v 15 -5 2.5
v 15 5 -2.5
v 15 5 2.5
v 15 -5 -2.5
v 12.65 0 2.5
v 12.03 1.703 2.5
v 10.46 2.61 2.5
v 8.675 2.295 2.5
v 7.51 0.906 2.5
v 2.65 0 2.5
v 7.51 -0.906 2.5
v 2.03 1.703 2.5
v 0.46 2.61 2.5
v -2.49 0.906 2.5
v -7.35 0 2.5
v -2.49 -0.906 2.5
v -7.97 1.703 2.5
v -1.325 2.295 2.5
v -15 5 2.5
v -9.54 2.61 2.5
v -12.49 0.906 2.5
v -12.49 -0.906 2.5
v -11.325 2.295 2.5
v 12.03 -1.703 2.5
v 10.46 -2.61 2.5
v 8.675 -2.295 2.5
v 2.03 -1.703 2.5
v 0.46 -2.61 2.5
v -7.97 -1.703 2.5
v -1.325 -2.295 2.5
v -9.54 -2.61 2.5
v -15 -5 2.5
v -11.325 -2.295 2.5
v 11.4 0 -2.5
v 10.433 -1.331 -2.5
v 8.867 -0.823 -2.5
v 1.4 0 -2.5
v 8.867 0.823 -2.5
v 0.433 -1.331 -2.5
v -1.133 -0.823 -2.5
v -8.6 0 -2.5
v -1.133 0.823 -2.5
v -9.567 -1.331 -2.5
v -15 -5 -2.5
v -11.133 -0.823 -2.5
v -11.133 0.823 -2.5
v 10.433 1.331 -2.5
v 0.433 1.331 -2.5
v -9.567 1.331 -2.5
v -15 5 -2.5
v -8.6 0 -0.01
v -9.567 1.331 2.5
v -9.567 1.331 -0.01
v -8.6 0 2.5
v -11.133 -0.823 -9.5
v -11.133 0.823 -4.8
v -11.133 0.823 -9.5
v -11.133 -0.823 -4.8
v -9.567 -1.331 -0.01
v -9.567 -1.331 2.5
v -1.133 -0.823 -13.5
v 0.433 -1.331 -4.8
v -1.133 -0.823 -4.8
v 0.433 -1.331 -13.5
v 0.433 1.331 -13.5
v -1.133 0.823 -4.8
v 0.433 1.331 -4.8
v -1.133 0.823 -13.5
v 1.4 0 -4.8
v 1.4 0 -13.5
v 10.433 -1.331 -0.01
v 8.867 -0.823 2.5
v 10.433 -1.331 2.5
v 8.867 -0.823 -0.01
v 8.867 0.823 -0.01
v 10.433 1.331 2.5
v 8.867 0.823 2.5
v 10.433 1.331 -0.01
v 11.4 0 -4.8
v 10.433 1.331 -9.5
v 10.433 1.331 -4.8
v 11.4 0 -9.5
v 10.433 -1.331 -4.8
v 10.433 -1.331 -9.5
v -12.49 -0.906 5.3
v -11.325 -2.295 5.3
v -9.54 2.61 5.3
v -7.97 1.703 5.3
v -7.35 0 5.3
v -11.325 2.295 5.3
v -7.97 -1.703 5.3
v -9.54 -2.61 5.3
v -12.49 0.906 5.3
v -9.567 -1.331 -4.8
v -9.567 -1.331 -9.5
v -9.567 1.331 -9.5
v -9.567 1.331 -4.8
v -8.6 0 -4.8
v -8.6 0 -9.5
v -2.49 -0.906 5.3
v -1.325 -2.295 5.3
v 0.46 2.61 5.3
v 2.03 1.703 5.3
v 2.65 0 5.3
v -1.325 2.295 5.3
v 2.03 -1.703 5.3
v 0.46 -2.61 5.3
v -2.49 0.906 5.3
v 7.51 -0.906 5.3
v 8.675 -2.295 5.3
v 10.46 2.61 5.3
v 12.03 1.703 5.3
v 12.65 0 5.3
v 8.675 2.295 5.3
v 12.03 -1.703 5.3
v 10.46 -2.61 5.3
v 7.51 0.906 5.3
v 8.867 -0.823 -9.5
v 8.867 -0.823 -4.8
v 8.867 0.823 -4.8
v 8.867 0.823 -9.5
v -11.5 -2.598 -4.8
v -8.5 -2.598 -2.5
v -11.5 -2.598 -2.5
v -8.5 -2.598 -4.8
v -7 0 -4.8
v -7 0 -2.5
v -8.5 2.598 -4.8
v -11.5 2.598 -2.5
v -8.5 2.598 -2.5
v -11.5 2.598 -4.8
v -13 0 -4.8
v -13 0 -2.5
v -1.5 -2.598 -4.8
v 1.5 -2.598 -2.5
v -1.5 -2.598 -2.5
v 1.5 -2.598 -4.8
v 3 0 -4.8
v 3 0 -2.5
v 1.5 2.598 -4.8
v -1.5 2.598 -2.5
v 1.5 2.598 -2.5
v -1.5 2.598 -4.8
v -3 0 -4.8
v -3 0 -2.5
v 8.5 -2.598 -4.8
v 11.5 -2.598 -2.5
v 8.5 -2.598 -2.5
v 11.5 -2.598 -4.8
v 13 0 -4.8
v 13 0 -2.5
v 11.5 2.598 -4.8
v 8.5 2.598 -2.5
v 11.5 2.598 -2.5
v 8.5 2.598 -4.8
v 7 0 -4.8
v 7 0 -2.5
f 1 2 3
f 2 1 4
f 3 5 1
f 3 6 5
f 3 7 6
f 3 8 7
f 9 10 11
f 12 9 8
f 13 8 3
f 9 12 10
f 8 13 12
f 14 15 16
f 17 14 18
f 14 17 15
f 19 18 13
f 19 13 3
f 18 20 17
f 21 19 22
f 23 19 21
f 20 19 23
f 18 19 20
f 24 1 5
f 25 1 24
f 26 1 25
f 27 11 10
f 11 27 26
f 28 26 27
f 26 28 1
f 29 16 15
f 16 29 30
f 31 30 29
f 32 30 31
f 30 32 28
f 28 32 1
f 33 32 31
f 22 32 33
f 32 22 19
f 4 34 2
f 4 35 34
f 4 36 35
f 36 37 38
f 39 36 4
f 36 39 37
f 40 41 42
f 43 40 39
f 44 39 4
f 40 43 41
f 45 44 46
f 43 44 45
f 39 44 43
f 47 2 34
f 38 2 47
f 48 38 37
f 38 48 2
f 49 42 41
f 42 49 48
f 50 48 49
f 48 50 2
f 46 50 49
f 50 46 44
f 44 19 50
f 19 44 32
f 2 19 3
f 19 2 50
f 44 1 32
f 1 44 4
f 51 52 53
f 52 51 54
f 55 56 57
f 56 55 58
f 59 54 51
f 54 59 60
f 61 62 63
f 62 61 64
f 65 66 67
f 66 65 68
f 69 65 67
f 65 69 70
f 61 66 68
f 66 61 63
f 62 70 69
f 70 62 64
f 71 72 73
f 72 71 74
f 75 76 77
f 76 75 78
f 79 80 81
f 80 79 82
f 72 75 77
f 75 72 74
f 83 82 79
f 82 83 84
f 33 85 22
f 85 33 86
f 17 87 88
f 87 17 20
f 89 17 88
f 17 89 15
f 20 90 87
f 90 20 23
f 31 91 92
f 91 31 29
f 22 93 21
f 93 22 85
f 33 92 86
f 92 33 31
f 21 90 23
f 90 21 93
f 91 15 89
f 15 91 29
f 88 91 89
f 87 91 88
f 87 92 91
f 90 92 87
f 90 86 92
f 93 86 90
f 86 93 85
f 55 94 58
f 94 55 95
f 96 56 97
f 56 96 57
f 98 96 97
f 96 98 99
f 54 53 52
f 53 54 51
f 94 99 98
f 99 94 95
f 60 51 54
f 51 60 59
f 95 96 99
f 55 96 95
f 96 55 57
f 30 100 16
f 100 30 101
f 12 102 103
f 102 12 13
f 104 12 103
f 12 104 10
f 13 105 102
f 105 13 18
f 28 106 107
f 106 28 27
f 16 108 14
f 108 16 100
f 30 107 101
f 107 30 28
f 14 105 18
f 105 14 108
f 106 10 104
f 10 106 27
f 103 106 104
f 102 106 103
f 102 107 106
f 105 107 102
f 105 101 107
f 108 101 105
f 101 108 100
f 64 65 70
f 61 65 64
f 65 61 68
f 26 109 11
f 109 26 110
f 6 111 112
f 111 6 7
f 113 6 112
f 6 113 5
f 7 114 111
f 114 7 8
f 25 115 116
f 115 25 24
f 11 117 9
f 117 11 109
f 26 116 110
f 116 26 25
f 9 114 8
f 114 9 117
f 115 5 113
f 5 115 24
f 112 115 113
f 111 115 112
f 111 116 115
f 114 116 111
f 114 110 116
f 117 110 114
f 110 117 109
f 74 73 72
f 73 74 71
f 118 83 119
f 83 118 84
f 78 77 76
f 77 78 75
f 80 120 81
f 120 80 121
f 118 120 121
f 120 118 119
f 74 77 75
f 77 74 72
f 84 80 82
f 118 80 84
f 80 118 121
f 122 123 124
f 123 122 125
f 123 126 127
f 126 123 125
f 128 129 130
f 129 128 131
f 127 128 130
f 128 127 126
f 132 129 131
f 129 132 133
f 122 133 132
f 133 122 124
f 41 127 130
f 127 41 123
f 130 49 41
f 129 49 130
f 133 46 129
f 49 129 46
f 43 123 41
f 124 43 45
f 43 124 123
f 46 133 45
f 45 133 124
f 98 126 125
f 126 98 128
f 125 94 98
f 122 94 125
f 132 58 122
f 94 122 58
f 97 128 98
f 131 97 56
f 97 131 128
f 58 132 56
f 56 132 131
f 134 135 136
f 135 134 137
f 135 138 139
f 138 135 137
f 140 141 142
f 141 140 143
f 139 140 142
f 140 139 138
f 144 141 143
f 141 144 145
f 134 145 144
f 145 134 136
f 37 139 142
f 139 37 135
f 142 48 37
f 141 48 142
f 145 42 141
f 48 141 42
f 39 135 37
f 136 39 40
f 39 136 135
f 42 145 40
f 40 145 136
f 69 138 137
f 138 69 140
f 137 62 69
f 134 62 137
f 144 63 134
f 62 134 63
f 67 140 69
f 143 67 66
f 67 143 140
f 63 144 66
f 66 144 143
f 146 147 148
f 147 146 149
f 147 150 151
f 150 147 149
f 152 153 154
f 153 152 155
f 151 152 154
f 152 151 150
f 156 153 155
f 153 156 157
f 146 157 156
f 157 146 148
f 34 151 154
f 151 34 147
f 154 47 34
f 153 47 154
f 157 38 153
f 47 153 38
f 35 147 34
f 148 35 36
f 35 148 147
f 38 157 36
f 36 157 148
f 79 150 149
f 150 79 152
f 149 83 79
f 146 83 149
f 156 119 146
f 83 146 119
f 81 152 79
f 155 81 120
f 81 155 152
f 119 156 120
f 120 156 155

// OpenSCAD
// Generated by SolidPython 0.4.0 on 2019-09-03 12:41:31


union() {
	difference() {
		cube(center = true, size = [30, 10, 5]);
		translate(v = [-10, 0, 0]) {
			translate(v = [0, 0, -0.0100000000]) {
				cylinder(h = 5.0200000000, r = 1.4000000000);
			}
		}
		translate(v = [0, 0, -0.0100000000]) {
			cylinder(h = 5.0200000000, r = 1.4000000000);
		}
		translate(v = [10, 0, 0]) {
			translate(v = [0, 0, -0.0100000000]) {
				cylinder(h = 5.0200000000, r = 1.4000000000);
			}
		}
	}
	translate(v = [-10, 0, 2.5000000000]) {
		union() {
			cylinder(h = 2.8000000000, r = 2.6500000000);
			translate(v = [0, 0, -12]) {
				cylinder(h = 12, r = 1.4000000000);
			}
		}
	}
	translate(v = [0, 0, 2.5000000000]) {
		union() {
			cylinder(h = 2.8000000000, r = 2.6500000000);
			translate(v = [0, 0, -16]) {
				cylinder(h = 16, r = 1.4000000000);
			}
		}
	}
	translate(v = [10, 0, 2.5000000000]) {
		union() {
			cylinder(h = 2.8000000000, r = 2.6500000000);
			translate(v = [0, 0, -12]) {
				cylinder(h = 12, r = 1.4000000000);
			}
		}
	}
	translate(v = [-10, 0, -4.8000000000]) {
		difference() {
			cylinder($fn = 6, h = 2.3000000000, r = 3);
			translate(v = [0, 0, -0.0100000000]) {
				cylinder(h = 2.3200000000, r = 1.4000000000);
			}
		}
	}
	translate(v = [0, 0, -4.8000000000]) {
		difference() {
			cylinder($fn = 6, h = 2.3000000000, r = 3);
			translate(v = [0, 0, -0.0100000000]) {
				cylinder(h = 2.3200000000, r = 1.4000000000);
			}
		}
	}
	translate(v = [10, 0, -4.8000000000]) {
		difference() {
			cylinder($fn = 6, h = 2.3000000000, r = 3);
			translate(v = [0, 0, -0.0100000000]) {
				cylinder(h = 2.3200000000, r = 1.4000000000);
			}
		}
	}
}
/***********************************************
*********      SolidPython code:      **********
************************************************
 
#! /usr/bin/env python
# -*- coding: utf-8 -*-

# Basic shape with several repeated parts, demonstrating the use of
# solid.utils.bill_of_materials()
#
# Basically:
#   -- Define every part you want in the Bill of Materials in a function
#   -- Use the 'bom_part' decorator ahead of the definition of each part's function
#           e.g.:
# @bom_part()
# def my_part():
#     pass
#   -- Optionally, you can add a description and a per-unit cost to the
#       decorator invocations.
#
#   -- To generate the bill of materials, call solid.utils.bill_of_materials()
#
#       -ETJ 08 Mar 2011

import os
import sys

from solid import *
from solid.utils import *

head_rad = 2.65
head_height = 2.8

nut_height = 2.3
nut_rad = 3

m3_rad = 1.4

doohickey_h = 5

set_bom_headers("link", "leftover")

def head():
    return cylinder(h=head_height, r=head_rad)


@bom_part("M3x16 Bolt", 0.12, currency="€", link="http://example.io/M3x16", leftover=0)
def m3_16(a=3):
    bolt_height = 16
    m = union()(
        head(),
        translate([0, 0, -bolt_height])(
            cylinder(r=m3_rad, h=bolt_height)
        )
    )
    return m


@bom_part("M3x12 Bolt", 0.09, leftover=0)
def m3_12():
    bolt_height = 12
    m = union()(
        head(),
        translate([0, 0, -bolt_height])(
            cylinder(r=m3_rad, h=bolt_height)
        )
    )
    return m


@bom_part("M3 Nut", 0.04, currency="R$")
def m3_nut():
    hx = cylinder(r=nut_rad, h=nut_height)
    hx.add_param('$fn', 6)  # make the nut hexagonal
    n = difference()(
        hx,
        translate([0, 0, -EPSILON])(
            cylinder(r=m3_rad, h=nut_height + 2 * EPSILON)
        )
    )
    return n


@bom_part()
def doohickey():
    hole_cyl = translate([0, 0, -EPSILON])(
        cylinder(r=m3_rad, h=doohickey_h + 2 * EPSILON)
    )
    d = difference()(
        cube([30, 10, doohickey_h], center=True),
        translate([-10, 0, 0])(hole_cyl),
        hole_cyl,
        translate([10, 0, 0])(hole_cyl)
    )
    return d


def assemble():
    return union()(
        doohickey(),
        translate([-10, 0, doohickey_h / 2])(m3_12()),
        translate([  0, 0, doohickey_h / 2])(m3_16()),
        translate([ 10, 0, doohickey_h / 2])(m3_12()),
        # Nuts
        translate([-10, 0, -nut_height - doohickey_h / 2])(m3_nut()),
        translate([  0, 0, -nut_height - doohickey_h / 2])(m3_nut()),
        translate([ 10, 0, -nut_height - doohickey_h / 2])(m3_nut()),
    )

if __name__ == '__main__':
    out_dir = sys.argv[1] if len(sys.argv) > 1 else os.curdir
    file_out = os.path.join(out_dir, 'BOM_example.scad')

    a = assemble()

    bom = bill_of_materials()

    print("%(__file__)s: SCAD file written to: \n%(file_out)s" % vars())
    print(bom)

    print("Or, Spreadsheet-ready TSV:\n\n")
    bom = bill_of_materials(csv=True)
    print(bom)


    scad_render_to_file(a, file_out)
 
 
************************************************/
